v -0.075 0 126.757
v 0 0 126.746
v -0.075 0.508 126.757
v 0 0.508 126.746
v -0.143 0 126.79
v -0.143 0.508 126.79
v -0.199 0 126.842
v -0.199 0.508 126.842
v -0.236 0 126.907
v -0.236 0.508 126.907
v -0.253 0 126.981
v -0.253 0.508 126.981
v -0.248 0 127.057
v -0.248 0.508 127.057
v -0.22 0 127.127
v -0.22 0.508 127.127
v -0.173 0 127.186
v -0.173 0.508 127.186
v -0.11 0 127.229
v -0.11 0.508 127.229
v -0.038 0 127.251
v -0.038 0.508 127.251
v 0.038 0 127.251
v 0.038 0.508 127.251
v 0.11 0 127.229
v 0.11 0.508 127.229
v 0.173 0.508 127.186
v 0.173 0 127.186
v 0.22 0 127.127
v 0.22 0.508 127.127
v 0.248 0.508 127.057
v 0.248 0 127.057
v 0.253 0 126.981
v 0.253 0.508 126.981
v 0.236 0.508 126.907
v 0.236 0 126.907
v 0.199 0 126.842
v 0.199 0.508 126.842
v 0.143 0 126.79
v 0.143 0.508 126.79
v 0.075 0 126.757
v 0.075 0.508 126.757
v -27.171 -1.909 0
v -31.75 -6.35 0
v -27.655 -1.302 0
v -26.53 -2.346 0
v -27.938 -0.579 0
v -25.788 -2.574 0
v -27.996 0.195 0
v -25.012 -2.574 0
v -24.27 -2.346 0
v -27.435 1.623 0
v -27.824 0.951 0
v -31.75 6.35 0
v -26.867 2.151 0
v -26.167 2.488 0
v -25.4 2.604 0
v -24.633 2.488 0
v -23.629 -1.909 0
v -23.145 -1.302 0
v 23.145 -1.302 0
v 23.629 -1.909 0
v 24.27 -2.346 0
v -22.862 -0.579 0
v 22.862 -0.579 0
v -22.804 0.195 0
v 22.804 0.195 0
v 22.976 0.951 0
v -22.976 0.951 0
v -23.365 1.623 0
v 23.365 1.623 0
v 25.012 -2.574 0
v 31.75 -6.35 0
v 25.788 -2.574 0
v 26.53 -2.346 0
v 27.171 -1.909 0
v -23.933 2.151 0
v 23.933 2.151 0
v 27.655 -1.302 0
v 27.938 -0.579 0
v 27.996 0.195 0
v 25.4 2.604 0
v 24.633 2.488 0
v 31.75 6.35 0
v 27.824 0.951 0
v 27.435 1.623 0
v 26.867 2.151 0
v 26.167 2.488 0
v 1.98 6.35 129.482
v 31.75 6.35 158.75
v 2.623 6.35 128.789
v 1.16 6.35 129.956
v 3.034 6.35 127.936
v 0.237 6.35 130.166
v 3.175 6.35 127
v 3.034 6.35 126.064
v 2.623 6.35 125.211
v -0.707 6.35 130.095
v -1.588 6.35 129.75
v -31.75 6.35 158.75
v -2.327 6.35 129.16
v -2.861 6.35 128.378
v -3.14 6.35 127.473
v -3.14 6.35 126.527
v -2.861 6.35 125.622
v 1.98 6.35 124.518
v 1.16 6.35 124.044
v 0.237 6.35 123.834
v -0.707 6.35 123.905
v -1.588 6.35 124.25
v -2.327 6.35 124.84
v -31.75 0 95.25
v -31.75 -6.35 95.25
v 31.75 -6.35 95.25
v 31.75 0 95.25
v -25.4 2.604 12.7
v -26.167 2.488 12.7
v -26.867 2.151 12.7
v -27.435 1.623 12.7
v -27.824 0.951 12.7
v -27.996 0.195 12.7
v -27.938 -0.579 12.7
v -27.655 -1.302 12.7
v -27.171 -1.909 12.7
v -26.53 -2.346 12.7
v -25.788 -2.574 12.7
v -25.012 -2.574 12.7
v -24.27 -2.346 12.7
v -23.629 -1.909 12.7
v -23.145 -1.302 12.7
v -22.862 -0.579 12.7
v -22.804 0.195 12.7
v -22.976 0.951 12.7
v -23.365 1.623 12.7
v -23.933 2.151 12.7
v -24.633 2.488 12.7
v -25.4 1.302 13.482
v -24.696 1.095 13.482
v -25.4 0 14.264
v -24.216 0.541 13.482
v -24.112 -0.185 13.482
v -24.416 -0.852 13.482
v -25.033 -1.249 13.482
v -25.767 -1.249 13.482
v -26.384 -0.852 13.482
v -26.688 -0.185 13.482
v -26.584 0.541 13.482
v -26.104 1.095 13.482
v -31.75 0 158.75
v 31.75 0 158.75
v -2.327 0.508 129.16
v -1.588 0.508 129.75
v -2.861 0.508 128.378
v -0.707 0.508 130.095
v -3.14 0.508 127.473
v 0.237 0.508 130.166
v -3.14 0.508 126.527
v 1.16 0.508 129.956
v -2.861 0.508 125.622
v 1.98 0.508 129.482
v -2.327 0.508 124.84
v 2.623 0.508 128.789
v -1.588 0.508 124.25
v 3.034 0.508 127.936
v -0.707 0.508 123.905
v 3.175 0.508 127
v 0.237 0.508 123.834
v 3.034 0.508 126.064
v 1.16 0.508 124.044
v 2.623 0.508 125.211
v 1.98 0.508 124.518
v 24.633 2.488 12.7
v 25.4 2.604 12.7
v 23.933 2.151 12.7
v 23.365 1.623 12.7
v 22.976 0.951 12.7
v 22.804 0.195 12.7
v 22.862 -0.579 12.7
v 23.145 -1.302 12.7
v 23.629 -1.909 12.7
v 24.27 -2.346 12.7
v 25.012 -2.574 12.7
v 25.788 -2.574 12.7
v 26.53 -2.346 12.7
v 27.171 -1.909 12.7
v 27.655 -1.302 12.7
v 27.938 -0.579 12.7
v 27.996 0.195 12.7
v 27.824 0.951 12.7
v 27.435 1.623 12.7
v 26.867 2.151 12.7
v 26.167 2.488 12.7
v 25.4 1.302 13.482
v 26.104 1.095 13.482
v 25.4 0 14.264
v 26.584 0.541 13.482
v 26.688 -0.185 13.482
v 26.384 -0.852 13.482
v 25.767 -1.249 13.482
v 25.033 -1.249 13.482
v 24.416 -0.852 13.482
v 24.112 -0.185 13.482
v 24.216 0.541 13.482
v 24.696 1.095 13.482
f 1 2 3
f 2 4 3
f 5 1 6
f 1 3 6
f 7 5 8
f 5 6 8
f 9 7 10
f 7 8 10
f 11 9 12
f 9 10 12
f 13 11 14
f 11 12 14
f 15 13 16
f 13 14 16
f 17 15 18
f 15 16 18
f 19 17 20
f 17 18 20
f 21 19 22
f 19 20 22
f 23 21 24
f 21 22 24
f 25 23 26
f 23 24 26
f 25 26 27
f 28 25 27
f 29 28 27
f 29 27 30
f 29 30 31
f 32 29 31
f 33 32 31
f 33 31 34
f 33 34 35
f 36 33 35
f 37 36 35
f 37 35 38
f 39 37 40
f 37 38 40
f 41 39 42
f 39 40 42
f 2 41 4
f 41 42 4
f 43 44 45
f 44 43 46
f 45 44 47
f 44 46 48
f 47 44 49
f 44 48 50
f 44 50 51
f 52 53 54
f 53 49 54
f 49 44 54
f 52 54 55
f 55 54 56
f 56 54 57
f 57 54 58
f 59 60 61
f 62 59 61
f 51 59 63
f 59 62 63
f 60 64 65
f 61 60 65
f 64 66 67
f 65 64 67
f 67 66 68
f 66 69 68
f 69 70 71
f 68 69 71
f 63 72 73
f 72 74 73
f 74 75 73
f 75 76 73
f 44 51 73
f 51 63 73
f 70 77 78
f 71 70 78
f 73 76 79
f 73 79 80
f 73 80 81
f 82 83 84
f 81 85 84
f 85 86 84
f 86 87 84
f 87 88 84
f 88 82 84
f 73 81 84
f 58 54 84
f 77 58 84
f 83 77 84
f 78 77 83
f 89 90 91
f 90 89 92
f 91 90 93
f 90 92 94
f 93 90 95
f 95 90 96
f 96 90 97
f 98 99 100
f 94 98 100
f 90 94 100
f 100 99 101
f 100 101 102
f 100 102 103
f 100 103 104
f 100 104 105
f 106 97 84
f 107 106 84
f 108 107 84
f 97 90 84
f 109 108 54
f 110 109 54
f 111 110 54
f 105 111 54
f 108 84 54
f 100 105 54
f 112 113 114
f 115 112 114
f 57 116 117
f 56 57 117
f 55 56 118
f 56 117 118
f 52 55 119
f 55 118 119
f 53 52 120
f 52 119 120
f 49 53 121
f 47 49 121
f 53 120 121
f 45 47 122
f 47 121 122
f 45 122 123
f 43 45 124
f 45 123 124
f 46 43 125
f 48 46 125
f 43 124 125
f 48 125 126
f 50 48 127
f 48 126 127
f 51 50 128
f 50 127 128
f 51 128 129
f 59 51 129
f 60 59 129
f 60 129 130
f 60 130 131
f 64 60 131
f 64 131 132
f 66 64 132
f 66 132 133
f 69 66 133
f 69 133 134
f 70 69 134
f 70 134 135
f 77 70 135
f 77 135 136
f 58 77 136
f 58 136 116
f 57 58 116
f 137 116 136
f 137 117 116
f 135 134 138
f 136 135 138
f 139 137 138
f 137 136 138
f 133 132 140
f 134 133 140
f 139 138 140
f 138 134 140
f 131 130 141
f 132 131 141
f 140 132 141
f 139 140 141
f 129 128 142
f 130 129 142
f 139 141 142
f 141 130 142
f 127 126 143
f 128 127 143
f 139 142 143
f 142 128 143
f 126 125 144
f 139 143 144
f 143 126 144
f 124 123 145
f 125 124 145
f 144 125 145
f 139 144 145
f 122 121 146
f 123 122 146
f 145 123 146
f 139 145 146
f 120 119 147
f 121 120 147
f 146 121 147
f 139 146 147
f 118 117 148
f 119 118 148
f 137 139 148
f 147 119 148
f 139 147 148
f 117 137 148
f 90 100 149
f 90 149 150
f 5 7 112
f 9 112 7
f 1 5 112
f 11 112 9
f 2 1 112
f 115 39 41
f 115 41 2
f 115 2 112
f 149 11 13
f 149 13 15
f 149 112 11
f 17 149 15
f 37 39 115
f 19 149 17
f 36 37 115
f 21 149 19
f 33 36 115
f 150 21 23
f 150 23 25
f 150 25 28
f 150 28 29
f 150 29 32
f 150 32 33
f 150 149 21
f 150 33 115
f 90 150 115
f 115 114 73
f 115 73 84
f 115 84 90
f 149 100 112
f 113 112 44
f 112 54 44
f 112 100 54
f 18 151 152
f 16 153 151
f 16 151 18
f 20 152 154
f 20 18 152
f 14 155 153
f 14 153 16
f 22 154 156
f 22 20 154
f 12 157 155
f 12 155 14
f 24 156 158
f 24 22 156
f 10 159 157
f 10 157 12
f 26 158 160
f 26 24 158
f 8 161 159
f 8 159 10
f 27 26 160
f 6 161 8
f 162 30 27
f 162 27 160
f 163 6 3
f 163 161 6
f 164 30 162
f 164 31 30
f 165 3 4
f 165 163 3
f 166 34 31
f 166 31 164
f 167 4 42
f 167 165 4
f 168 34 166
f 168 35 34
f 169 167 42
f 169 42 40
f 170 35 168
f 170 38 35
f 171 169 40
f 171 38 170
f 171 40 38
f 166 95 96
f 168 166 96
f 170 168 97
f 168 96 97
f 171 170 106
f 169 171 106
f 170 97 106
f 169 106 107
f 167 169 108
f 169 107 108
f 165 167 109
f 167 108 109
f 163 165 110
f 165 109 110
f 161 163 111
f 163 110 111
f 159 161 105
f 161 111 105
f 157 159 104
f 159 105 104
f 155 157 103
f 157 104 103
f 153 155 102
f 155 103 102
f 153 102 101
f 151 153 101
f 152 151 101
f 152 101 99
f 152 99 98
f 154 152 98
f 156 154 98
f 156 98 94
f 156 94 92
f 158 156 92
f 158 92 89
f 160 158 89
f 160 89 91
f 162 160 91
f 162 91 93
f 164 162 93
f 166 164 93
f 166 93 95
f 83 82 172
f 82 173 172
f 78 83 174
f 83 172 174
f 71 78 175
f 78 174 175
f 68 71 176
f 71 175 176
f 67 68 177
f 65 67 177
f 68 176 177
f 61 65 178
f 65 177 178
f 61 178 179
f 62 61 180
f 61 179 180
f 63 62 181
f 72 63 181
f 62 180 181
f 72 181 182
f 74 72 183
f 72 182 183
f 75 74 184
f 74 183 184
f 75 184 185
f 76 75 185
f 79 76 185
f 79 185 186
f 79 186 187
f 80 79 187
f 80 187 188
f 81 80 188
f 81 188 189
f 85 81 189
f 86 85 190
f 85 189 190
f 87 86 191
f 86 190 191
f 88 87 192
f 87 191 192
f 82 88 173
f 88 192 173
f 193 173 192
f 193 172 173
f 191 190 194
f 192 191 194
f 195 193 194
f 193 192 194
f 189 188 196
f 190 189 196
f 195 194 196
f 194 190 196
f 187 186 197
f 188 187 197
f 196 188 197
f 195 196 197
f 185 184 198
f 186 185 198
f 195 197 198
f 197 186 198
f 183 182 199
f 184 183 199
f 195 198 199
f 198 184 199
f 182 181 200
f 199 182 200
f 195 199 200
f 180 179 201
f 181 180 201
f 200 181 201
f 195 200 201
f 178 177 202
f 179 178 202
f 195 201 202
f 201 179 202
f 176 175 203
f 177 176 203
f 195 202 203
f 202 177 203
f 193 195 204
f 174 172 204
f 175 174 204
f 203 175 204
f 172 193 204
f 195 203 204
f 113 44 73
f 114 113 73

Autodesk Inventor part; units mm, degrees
ref_plane "YZ Plane" through (0, 0, 0) normal (1, 0, 0) x (0, 1, 0)
ref_plane "XZ Plane" through (0, 0, 0) normal (0, 1, 0) x (-1, 0, 0)
ref_plane "XY Plane" through (0, 0, 0) normal (0, 0, 1) x (1, 0, 0)
sketch "Sketch1" plane through (0, 0, 0) normal (0, 0, 1) x (1, 0, 0)
  line L0 (-31.75, -6.35) -> (31.75, -6.35)
  line L1 (31.75, -6.35) -> (31.75, 6.35)
  line L2 (31.75, 6.35) -> (-31.75, 6.35)
  line L3 (-31.75, 6.35) -> (-31.75, -6.35)
  line L4 (-31.75, -6.35) -> (31.75, 6.35) construction
  line L5 (31.75, -6.35) -> (-31.75, 6.35) construction
  point P0 (0, 0)
  dimension "d0" = 63.5
  dimension "d1" = 12.7
extrude "Extrusion1" add sketch "Sketch1" along normal blind 158.75
sketch "Sketch2" plane through (-31.75, -6.35, 0) normal (0, -1, 0) x (1, 0, 0)
  line L0 (63.5, 0) -> (63.5, 158.75) projected
  line L1 (0, 95.25) -> (63.5, 95.25)
  line L2 (63.5, 95.25) -> (63.5, 158.75)
  line L3 (63.5, 158.75) -> (0, 158.75)
  line L4 (0, 158.75) -> (0, 95.25)
  line L5 (0, 95.25) -> (63.5, 158.75) construction
  line L6 (63.5, 95.25) -> (0, 158.75) construction
  point P0 (31.75, 0)
  point P1 (31.75, 127)
  dimension "d4" = 127
extrude "Extrusion2" cut sketch "Sketch2" against normal blind 6.35
sketch "Sketch3" plane through (0, 0, 0) normal (0, 0, -1) x (-1, 0, 0)
  line L0 (31.75, 0) -> (-31.75, 0) projected
  point P0 (0, 0)
  point P1 (-25.4, 0)
  point P2 (25.4, 0)
  dimension "d7" = 25.4
  dimension "d8" = 25.4
hole "Hole1" at (25.4, 0, 0) at (-25.4, 0, 0) direction (0, 0, 1) diameter 5.207 depth 12.7 tip angle 118
sketch "Sketch4" plane through (-31.75, 0, 0) normal (0, -1, 0) x (1, 0, 0)
  line L0 (0, 0) -> (63.5, 0) projected
  circle A0 centre (31.75, 127) radius 4.4323
  circle A1 centre (31.75, 127) radius 8.8646
  circle A2 centre (31.75, 127) radius 13.2969
  circle A3 centre (31.75, 127) radius 17.7292
  circle A4 centre (31.75, 127) radius 22.1615
  circle A5 centre (31.75, 127) radius 26.5938
  point P0 (31.75, 0)
  dimension "d16" = 127
  dimension "d17" = 8.8646
  dimension "d18" = 17.7292
  dimension "d19" = 26.5938
  dimension "d20" = 35.4584
  dimension "d21" = 44.323
  dimension "d33" = 53.1876
sketch "Sketch5" plane through (-31.75, 6.35, 0) normal (0, 1, 0) x (1, 0, 0)
  line L0 (63.5, 0) -> (0, 0) projected
  circle A0 centre (31.75, -127) radius 3.175
  point P0 (31.75, 0)
  dimension "d22" = 127
  dimension "d23" = 6.35
extrude "Extrusion3" cut sketch "Sketch5" against normal blind 5.842
hole "Hole2" at (0, 0, 127) direction (0, 1, 0) diameter 0.508 end through all
properties part number "target"
